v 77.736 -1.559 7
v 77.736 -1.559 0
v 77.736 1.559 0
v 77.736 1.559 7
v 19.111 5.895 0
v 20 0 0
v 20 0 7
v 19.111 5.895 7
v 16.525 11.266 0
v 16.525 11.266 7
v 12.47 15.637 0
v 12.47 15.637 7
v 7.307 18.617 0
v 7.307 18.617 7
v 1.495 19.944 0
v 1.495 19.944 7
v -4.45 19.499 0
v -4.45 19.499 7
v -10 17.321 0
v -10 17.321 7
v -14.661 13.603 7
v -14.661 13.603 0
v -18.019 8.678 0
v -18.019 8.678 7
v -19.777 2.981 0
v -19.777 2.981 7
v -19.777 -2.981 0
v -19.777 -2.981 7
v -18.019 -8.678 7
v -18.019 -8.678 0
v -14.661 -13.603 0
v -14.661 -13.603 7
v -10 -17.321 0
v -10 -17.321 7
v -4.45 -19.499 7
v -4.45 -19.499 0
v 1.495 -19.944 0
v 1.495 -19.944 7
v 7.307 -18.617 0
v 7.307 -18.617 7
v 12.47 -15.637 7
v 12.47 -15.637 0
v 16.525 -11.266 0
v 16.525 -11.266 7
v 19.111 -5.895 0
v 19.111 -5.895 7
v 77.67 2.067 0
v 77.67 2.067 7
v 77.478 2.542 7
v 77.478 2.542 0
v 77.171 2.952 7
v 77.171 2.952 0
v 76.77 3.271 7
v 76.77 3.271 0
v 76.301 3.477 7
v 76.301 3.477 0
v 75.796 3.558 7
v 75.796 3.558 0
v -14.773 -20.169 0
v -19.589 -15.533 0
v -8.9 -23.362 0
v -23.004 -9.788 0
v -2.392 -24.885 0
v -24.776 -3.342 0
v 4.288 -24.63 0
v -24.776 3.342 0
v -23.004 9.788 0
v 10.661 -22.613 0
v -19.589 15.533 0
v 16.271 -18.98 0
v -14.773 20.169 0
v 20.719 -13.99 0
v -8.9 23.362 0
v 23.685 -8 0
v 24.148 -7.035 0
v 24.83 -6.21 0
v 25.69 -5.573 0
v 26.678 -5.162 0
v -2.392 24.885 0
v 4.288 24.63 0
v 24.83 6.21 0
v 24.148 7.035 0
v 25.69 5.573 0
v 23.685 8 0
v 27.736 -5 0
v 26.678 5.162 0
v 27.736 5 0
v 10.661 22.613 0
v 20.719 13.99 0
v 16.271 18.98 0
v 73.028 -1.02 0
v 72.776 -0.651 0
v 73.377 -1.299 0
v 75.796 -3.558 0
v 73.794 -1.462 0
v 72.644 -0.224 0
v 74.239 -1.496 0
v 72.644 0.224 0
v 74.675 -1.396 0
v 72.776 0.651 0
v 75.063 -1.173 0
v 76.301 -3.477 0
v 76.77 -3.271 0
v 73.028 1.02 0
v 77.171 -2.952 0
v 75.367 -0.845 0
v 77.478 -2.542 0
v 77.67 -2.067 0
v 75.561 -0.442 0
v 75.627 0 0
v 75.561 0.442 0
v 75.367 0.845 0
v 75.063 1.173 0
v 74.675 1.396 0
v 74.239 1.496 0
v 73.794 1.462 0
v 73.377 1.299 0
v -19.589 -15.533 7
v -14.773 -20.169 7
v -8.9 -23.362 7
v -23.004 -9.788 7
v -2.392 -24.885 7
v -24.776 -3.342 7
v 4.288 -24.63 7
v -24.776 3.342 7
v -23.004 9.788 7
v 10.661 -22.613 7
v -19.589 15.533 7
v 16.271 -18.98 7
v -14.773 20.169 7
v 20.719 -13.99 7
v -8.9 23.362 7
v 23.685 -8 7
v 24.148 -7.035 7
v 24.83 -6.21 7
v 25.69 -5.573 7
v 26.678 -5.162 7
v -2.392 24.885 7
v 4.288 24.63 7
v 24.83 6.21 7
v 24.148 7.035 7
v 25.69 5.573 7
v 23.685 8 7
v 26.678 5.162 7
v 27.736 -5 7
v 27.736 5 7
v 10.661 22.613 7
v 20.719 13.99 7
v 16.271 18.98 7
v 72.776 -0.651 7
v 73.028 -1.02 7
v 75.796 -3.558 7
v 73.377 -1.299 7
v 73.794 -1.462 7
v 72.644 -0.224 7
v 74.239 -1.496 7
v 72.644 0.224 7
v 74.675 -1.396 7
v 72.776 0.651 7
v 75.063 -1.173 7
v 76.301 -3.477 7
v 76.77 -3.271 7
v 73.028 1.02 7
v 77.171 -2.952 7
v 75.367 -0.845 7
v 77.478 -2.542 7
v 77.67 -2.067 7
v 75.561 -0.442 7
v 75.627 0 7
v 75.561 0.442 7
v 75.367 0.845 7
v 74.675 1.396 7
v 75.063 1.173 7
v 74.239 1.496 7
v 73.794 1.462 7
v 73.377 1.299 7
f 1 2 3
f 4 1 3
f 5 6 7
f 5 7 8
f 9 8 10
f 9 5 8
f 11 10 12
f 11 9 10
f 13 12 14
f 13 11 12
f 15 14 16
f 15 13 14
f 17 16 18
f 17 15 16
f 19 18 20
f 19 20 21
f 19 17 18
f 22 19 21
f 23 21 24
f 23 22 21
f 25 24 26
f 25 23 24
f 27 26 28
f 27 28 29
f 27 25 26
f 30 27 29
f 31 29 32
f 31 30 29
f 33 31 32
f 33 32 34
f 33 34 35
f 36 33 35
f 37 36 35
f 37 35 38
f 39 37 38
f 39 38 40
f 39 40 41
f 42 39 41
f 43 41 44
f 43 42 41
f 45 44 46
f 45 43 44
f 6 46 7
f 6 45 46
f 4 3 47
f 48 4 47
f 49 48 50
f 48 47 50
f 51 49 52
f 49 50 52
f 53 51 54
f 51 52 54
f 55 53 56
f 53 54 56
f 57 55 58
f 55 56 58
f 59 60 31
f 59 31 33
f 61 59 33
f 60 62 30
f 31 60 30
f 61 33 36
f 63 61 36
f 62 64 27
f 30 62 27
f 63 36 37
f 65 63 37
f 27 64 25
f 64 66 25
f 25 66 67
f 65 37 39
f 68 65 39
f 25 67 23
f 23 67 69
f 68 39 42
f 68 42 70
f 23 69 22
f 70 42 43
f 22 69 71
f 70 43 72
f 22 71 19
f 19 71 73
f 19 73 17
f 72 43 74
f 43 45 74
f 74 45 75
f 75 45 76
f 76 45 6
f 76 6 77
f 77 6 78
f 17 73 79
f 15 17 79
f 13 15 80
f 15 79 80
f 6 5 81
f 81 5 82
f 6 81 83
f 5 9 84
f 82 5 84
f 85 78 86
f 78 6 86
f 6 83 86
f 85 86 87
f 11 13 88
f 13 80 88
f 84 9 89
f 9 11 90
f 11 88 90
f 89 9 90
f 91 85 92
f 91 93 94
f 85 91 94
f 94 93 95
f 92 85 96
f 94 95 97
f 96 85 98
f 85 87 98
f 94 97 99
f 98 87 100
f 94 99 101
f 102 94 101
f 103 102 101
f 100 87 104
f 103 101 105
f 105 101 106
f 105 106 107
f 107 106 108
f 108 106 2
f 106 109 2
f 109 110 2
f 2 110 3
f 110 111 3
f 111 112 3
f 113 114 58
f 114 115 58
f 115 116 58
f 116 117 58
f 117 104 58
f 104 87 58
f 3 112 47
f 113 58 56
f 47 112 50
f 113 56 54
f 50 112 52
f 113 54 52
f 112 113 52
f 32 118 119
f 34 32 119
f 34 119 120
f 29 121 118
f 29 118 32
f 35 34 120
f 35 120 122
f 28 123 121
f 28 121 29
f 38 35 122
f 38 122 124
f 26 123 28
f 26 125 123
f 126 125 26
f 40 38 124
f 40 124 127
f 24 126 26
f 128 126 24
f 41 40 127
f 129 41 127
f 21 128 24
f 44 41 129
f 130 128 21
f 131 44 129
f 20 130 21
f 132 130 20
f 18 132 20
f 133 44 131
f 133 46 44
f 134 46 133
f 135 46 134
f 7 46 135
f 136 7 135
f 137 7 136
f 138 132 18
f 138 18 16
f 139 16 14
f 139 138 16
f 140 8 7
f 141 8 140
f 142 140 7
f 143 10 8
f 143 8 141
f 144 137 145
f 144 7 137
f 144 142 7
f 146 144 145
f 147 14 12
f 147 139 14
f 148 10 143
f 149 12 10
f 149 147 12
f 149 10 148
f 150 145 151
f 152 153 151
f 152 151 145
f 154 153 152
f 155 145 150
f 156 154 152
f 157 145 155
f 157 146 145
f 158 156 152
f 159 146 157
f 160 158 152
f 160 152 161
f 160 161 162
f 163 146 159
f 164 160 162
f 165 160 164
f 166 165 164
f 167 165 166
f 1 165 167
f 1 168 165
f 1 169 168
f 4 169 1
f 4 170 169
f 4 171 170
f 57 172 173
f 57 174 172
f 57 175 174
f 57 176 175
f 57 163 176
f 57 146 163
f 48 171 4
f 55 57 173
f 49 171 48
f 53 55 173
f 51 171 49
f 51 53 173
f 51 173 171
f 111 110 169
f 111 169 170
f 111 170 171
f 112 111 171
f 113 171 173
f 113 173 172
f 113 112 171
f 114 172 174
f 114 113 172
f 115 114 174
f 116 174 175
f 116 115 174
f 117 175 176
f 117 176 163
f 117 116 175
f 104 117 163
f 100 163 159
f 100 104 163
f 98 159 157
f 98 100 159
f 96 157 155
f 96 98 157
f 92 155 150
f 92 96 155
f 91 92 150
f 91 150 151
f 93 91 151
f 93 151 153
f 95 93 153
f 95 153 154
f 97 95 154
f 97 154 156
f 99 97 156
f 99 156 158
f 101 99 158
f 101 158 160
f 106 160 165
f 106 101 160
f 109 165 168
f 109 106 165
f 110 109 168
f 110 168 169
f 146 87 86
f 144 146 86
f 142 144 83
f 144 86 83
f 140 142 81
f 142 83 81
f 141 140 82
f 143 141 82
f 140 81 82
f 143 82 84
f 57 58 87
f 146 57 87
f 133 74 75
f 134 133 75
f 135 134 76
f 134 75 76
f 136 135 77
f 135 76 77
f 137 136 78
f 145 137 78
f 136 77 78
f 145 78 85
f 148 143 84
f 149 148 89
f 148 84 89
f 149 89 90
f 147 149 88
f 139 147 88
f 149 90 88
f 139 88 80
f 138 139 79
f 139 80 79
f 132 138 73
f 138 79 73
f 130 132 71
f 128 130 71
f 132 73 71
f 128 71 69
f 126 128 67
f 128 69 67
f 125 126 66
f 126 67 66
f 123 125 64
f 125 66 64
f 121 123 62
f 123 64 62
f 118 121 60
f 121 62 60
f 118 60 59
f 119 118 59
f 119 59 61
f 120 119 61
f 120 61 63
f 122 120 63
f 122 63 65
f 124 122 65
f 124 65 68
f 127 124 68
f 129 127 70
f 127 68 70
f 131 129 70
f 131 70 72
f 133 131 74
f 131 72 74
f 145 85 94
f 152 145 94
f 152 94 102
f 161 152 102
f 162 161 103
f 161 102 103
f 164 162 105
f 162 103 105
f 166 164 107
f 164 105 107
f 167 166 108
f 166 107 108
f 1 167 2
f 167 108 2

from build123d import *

# Parameters (mm, degrees)
SKETCH1_R           = 20
SKETCH1_R_2         = 1.5
BOSS_EXTRUDE1_DEPTH = 7


with BuildPart() as part:
    # Sketch1 → Boss-Extrude1 (new body)
    with BuildSketch(Plane.XY):
        with BuildLine():
            Line((77.735606869, -1.559100202), (77.735606869, 1.559100202))
            ThreePointArc((77.735606869, 1.559100202), (77.170867479, 2.951948716), (75.795579887, 3.558200809))
            Line((75.795579887, 3.558200809), (27.735606869, 5))
            ThreePointArc((27.735606869, 5), (25.240316673, 5.865195462), (23.685438565, 8))
            ThreePointArc((23.685438565, 8), (-25, 0), (23.685438565, -8))
            ThreePointArc((23.685438565, -8), (25.240316673, -5.865195462), (27.735606869, -5))
            Line((27.735606869, -5), (75.795579887, -3.558200809))
            ThreePointArc((75.795579887, -3.558200809), (77.170867479, -2.951948716), (77.735606869, -1.559100202))
        make_face()
        Circle(SKETCH1_R, mode=Mode.SUBTRACT)
        with Locations((74.127359446, 0)):
            Circle(SKETCH1_R_2, mode=Mode.SUBTRACT)
    extrude(amount=BOSS_EXTRUDE1_DEPTH)


solid = part.part
